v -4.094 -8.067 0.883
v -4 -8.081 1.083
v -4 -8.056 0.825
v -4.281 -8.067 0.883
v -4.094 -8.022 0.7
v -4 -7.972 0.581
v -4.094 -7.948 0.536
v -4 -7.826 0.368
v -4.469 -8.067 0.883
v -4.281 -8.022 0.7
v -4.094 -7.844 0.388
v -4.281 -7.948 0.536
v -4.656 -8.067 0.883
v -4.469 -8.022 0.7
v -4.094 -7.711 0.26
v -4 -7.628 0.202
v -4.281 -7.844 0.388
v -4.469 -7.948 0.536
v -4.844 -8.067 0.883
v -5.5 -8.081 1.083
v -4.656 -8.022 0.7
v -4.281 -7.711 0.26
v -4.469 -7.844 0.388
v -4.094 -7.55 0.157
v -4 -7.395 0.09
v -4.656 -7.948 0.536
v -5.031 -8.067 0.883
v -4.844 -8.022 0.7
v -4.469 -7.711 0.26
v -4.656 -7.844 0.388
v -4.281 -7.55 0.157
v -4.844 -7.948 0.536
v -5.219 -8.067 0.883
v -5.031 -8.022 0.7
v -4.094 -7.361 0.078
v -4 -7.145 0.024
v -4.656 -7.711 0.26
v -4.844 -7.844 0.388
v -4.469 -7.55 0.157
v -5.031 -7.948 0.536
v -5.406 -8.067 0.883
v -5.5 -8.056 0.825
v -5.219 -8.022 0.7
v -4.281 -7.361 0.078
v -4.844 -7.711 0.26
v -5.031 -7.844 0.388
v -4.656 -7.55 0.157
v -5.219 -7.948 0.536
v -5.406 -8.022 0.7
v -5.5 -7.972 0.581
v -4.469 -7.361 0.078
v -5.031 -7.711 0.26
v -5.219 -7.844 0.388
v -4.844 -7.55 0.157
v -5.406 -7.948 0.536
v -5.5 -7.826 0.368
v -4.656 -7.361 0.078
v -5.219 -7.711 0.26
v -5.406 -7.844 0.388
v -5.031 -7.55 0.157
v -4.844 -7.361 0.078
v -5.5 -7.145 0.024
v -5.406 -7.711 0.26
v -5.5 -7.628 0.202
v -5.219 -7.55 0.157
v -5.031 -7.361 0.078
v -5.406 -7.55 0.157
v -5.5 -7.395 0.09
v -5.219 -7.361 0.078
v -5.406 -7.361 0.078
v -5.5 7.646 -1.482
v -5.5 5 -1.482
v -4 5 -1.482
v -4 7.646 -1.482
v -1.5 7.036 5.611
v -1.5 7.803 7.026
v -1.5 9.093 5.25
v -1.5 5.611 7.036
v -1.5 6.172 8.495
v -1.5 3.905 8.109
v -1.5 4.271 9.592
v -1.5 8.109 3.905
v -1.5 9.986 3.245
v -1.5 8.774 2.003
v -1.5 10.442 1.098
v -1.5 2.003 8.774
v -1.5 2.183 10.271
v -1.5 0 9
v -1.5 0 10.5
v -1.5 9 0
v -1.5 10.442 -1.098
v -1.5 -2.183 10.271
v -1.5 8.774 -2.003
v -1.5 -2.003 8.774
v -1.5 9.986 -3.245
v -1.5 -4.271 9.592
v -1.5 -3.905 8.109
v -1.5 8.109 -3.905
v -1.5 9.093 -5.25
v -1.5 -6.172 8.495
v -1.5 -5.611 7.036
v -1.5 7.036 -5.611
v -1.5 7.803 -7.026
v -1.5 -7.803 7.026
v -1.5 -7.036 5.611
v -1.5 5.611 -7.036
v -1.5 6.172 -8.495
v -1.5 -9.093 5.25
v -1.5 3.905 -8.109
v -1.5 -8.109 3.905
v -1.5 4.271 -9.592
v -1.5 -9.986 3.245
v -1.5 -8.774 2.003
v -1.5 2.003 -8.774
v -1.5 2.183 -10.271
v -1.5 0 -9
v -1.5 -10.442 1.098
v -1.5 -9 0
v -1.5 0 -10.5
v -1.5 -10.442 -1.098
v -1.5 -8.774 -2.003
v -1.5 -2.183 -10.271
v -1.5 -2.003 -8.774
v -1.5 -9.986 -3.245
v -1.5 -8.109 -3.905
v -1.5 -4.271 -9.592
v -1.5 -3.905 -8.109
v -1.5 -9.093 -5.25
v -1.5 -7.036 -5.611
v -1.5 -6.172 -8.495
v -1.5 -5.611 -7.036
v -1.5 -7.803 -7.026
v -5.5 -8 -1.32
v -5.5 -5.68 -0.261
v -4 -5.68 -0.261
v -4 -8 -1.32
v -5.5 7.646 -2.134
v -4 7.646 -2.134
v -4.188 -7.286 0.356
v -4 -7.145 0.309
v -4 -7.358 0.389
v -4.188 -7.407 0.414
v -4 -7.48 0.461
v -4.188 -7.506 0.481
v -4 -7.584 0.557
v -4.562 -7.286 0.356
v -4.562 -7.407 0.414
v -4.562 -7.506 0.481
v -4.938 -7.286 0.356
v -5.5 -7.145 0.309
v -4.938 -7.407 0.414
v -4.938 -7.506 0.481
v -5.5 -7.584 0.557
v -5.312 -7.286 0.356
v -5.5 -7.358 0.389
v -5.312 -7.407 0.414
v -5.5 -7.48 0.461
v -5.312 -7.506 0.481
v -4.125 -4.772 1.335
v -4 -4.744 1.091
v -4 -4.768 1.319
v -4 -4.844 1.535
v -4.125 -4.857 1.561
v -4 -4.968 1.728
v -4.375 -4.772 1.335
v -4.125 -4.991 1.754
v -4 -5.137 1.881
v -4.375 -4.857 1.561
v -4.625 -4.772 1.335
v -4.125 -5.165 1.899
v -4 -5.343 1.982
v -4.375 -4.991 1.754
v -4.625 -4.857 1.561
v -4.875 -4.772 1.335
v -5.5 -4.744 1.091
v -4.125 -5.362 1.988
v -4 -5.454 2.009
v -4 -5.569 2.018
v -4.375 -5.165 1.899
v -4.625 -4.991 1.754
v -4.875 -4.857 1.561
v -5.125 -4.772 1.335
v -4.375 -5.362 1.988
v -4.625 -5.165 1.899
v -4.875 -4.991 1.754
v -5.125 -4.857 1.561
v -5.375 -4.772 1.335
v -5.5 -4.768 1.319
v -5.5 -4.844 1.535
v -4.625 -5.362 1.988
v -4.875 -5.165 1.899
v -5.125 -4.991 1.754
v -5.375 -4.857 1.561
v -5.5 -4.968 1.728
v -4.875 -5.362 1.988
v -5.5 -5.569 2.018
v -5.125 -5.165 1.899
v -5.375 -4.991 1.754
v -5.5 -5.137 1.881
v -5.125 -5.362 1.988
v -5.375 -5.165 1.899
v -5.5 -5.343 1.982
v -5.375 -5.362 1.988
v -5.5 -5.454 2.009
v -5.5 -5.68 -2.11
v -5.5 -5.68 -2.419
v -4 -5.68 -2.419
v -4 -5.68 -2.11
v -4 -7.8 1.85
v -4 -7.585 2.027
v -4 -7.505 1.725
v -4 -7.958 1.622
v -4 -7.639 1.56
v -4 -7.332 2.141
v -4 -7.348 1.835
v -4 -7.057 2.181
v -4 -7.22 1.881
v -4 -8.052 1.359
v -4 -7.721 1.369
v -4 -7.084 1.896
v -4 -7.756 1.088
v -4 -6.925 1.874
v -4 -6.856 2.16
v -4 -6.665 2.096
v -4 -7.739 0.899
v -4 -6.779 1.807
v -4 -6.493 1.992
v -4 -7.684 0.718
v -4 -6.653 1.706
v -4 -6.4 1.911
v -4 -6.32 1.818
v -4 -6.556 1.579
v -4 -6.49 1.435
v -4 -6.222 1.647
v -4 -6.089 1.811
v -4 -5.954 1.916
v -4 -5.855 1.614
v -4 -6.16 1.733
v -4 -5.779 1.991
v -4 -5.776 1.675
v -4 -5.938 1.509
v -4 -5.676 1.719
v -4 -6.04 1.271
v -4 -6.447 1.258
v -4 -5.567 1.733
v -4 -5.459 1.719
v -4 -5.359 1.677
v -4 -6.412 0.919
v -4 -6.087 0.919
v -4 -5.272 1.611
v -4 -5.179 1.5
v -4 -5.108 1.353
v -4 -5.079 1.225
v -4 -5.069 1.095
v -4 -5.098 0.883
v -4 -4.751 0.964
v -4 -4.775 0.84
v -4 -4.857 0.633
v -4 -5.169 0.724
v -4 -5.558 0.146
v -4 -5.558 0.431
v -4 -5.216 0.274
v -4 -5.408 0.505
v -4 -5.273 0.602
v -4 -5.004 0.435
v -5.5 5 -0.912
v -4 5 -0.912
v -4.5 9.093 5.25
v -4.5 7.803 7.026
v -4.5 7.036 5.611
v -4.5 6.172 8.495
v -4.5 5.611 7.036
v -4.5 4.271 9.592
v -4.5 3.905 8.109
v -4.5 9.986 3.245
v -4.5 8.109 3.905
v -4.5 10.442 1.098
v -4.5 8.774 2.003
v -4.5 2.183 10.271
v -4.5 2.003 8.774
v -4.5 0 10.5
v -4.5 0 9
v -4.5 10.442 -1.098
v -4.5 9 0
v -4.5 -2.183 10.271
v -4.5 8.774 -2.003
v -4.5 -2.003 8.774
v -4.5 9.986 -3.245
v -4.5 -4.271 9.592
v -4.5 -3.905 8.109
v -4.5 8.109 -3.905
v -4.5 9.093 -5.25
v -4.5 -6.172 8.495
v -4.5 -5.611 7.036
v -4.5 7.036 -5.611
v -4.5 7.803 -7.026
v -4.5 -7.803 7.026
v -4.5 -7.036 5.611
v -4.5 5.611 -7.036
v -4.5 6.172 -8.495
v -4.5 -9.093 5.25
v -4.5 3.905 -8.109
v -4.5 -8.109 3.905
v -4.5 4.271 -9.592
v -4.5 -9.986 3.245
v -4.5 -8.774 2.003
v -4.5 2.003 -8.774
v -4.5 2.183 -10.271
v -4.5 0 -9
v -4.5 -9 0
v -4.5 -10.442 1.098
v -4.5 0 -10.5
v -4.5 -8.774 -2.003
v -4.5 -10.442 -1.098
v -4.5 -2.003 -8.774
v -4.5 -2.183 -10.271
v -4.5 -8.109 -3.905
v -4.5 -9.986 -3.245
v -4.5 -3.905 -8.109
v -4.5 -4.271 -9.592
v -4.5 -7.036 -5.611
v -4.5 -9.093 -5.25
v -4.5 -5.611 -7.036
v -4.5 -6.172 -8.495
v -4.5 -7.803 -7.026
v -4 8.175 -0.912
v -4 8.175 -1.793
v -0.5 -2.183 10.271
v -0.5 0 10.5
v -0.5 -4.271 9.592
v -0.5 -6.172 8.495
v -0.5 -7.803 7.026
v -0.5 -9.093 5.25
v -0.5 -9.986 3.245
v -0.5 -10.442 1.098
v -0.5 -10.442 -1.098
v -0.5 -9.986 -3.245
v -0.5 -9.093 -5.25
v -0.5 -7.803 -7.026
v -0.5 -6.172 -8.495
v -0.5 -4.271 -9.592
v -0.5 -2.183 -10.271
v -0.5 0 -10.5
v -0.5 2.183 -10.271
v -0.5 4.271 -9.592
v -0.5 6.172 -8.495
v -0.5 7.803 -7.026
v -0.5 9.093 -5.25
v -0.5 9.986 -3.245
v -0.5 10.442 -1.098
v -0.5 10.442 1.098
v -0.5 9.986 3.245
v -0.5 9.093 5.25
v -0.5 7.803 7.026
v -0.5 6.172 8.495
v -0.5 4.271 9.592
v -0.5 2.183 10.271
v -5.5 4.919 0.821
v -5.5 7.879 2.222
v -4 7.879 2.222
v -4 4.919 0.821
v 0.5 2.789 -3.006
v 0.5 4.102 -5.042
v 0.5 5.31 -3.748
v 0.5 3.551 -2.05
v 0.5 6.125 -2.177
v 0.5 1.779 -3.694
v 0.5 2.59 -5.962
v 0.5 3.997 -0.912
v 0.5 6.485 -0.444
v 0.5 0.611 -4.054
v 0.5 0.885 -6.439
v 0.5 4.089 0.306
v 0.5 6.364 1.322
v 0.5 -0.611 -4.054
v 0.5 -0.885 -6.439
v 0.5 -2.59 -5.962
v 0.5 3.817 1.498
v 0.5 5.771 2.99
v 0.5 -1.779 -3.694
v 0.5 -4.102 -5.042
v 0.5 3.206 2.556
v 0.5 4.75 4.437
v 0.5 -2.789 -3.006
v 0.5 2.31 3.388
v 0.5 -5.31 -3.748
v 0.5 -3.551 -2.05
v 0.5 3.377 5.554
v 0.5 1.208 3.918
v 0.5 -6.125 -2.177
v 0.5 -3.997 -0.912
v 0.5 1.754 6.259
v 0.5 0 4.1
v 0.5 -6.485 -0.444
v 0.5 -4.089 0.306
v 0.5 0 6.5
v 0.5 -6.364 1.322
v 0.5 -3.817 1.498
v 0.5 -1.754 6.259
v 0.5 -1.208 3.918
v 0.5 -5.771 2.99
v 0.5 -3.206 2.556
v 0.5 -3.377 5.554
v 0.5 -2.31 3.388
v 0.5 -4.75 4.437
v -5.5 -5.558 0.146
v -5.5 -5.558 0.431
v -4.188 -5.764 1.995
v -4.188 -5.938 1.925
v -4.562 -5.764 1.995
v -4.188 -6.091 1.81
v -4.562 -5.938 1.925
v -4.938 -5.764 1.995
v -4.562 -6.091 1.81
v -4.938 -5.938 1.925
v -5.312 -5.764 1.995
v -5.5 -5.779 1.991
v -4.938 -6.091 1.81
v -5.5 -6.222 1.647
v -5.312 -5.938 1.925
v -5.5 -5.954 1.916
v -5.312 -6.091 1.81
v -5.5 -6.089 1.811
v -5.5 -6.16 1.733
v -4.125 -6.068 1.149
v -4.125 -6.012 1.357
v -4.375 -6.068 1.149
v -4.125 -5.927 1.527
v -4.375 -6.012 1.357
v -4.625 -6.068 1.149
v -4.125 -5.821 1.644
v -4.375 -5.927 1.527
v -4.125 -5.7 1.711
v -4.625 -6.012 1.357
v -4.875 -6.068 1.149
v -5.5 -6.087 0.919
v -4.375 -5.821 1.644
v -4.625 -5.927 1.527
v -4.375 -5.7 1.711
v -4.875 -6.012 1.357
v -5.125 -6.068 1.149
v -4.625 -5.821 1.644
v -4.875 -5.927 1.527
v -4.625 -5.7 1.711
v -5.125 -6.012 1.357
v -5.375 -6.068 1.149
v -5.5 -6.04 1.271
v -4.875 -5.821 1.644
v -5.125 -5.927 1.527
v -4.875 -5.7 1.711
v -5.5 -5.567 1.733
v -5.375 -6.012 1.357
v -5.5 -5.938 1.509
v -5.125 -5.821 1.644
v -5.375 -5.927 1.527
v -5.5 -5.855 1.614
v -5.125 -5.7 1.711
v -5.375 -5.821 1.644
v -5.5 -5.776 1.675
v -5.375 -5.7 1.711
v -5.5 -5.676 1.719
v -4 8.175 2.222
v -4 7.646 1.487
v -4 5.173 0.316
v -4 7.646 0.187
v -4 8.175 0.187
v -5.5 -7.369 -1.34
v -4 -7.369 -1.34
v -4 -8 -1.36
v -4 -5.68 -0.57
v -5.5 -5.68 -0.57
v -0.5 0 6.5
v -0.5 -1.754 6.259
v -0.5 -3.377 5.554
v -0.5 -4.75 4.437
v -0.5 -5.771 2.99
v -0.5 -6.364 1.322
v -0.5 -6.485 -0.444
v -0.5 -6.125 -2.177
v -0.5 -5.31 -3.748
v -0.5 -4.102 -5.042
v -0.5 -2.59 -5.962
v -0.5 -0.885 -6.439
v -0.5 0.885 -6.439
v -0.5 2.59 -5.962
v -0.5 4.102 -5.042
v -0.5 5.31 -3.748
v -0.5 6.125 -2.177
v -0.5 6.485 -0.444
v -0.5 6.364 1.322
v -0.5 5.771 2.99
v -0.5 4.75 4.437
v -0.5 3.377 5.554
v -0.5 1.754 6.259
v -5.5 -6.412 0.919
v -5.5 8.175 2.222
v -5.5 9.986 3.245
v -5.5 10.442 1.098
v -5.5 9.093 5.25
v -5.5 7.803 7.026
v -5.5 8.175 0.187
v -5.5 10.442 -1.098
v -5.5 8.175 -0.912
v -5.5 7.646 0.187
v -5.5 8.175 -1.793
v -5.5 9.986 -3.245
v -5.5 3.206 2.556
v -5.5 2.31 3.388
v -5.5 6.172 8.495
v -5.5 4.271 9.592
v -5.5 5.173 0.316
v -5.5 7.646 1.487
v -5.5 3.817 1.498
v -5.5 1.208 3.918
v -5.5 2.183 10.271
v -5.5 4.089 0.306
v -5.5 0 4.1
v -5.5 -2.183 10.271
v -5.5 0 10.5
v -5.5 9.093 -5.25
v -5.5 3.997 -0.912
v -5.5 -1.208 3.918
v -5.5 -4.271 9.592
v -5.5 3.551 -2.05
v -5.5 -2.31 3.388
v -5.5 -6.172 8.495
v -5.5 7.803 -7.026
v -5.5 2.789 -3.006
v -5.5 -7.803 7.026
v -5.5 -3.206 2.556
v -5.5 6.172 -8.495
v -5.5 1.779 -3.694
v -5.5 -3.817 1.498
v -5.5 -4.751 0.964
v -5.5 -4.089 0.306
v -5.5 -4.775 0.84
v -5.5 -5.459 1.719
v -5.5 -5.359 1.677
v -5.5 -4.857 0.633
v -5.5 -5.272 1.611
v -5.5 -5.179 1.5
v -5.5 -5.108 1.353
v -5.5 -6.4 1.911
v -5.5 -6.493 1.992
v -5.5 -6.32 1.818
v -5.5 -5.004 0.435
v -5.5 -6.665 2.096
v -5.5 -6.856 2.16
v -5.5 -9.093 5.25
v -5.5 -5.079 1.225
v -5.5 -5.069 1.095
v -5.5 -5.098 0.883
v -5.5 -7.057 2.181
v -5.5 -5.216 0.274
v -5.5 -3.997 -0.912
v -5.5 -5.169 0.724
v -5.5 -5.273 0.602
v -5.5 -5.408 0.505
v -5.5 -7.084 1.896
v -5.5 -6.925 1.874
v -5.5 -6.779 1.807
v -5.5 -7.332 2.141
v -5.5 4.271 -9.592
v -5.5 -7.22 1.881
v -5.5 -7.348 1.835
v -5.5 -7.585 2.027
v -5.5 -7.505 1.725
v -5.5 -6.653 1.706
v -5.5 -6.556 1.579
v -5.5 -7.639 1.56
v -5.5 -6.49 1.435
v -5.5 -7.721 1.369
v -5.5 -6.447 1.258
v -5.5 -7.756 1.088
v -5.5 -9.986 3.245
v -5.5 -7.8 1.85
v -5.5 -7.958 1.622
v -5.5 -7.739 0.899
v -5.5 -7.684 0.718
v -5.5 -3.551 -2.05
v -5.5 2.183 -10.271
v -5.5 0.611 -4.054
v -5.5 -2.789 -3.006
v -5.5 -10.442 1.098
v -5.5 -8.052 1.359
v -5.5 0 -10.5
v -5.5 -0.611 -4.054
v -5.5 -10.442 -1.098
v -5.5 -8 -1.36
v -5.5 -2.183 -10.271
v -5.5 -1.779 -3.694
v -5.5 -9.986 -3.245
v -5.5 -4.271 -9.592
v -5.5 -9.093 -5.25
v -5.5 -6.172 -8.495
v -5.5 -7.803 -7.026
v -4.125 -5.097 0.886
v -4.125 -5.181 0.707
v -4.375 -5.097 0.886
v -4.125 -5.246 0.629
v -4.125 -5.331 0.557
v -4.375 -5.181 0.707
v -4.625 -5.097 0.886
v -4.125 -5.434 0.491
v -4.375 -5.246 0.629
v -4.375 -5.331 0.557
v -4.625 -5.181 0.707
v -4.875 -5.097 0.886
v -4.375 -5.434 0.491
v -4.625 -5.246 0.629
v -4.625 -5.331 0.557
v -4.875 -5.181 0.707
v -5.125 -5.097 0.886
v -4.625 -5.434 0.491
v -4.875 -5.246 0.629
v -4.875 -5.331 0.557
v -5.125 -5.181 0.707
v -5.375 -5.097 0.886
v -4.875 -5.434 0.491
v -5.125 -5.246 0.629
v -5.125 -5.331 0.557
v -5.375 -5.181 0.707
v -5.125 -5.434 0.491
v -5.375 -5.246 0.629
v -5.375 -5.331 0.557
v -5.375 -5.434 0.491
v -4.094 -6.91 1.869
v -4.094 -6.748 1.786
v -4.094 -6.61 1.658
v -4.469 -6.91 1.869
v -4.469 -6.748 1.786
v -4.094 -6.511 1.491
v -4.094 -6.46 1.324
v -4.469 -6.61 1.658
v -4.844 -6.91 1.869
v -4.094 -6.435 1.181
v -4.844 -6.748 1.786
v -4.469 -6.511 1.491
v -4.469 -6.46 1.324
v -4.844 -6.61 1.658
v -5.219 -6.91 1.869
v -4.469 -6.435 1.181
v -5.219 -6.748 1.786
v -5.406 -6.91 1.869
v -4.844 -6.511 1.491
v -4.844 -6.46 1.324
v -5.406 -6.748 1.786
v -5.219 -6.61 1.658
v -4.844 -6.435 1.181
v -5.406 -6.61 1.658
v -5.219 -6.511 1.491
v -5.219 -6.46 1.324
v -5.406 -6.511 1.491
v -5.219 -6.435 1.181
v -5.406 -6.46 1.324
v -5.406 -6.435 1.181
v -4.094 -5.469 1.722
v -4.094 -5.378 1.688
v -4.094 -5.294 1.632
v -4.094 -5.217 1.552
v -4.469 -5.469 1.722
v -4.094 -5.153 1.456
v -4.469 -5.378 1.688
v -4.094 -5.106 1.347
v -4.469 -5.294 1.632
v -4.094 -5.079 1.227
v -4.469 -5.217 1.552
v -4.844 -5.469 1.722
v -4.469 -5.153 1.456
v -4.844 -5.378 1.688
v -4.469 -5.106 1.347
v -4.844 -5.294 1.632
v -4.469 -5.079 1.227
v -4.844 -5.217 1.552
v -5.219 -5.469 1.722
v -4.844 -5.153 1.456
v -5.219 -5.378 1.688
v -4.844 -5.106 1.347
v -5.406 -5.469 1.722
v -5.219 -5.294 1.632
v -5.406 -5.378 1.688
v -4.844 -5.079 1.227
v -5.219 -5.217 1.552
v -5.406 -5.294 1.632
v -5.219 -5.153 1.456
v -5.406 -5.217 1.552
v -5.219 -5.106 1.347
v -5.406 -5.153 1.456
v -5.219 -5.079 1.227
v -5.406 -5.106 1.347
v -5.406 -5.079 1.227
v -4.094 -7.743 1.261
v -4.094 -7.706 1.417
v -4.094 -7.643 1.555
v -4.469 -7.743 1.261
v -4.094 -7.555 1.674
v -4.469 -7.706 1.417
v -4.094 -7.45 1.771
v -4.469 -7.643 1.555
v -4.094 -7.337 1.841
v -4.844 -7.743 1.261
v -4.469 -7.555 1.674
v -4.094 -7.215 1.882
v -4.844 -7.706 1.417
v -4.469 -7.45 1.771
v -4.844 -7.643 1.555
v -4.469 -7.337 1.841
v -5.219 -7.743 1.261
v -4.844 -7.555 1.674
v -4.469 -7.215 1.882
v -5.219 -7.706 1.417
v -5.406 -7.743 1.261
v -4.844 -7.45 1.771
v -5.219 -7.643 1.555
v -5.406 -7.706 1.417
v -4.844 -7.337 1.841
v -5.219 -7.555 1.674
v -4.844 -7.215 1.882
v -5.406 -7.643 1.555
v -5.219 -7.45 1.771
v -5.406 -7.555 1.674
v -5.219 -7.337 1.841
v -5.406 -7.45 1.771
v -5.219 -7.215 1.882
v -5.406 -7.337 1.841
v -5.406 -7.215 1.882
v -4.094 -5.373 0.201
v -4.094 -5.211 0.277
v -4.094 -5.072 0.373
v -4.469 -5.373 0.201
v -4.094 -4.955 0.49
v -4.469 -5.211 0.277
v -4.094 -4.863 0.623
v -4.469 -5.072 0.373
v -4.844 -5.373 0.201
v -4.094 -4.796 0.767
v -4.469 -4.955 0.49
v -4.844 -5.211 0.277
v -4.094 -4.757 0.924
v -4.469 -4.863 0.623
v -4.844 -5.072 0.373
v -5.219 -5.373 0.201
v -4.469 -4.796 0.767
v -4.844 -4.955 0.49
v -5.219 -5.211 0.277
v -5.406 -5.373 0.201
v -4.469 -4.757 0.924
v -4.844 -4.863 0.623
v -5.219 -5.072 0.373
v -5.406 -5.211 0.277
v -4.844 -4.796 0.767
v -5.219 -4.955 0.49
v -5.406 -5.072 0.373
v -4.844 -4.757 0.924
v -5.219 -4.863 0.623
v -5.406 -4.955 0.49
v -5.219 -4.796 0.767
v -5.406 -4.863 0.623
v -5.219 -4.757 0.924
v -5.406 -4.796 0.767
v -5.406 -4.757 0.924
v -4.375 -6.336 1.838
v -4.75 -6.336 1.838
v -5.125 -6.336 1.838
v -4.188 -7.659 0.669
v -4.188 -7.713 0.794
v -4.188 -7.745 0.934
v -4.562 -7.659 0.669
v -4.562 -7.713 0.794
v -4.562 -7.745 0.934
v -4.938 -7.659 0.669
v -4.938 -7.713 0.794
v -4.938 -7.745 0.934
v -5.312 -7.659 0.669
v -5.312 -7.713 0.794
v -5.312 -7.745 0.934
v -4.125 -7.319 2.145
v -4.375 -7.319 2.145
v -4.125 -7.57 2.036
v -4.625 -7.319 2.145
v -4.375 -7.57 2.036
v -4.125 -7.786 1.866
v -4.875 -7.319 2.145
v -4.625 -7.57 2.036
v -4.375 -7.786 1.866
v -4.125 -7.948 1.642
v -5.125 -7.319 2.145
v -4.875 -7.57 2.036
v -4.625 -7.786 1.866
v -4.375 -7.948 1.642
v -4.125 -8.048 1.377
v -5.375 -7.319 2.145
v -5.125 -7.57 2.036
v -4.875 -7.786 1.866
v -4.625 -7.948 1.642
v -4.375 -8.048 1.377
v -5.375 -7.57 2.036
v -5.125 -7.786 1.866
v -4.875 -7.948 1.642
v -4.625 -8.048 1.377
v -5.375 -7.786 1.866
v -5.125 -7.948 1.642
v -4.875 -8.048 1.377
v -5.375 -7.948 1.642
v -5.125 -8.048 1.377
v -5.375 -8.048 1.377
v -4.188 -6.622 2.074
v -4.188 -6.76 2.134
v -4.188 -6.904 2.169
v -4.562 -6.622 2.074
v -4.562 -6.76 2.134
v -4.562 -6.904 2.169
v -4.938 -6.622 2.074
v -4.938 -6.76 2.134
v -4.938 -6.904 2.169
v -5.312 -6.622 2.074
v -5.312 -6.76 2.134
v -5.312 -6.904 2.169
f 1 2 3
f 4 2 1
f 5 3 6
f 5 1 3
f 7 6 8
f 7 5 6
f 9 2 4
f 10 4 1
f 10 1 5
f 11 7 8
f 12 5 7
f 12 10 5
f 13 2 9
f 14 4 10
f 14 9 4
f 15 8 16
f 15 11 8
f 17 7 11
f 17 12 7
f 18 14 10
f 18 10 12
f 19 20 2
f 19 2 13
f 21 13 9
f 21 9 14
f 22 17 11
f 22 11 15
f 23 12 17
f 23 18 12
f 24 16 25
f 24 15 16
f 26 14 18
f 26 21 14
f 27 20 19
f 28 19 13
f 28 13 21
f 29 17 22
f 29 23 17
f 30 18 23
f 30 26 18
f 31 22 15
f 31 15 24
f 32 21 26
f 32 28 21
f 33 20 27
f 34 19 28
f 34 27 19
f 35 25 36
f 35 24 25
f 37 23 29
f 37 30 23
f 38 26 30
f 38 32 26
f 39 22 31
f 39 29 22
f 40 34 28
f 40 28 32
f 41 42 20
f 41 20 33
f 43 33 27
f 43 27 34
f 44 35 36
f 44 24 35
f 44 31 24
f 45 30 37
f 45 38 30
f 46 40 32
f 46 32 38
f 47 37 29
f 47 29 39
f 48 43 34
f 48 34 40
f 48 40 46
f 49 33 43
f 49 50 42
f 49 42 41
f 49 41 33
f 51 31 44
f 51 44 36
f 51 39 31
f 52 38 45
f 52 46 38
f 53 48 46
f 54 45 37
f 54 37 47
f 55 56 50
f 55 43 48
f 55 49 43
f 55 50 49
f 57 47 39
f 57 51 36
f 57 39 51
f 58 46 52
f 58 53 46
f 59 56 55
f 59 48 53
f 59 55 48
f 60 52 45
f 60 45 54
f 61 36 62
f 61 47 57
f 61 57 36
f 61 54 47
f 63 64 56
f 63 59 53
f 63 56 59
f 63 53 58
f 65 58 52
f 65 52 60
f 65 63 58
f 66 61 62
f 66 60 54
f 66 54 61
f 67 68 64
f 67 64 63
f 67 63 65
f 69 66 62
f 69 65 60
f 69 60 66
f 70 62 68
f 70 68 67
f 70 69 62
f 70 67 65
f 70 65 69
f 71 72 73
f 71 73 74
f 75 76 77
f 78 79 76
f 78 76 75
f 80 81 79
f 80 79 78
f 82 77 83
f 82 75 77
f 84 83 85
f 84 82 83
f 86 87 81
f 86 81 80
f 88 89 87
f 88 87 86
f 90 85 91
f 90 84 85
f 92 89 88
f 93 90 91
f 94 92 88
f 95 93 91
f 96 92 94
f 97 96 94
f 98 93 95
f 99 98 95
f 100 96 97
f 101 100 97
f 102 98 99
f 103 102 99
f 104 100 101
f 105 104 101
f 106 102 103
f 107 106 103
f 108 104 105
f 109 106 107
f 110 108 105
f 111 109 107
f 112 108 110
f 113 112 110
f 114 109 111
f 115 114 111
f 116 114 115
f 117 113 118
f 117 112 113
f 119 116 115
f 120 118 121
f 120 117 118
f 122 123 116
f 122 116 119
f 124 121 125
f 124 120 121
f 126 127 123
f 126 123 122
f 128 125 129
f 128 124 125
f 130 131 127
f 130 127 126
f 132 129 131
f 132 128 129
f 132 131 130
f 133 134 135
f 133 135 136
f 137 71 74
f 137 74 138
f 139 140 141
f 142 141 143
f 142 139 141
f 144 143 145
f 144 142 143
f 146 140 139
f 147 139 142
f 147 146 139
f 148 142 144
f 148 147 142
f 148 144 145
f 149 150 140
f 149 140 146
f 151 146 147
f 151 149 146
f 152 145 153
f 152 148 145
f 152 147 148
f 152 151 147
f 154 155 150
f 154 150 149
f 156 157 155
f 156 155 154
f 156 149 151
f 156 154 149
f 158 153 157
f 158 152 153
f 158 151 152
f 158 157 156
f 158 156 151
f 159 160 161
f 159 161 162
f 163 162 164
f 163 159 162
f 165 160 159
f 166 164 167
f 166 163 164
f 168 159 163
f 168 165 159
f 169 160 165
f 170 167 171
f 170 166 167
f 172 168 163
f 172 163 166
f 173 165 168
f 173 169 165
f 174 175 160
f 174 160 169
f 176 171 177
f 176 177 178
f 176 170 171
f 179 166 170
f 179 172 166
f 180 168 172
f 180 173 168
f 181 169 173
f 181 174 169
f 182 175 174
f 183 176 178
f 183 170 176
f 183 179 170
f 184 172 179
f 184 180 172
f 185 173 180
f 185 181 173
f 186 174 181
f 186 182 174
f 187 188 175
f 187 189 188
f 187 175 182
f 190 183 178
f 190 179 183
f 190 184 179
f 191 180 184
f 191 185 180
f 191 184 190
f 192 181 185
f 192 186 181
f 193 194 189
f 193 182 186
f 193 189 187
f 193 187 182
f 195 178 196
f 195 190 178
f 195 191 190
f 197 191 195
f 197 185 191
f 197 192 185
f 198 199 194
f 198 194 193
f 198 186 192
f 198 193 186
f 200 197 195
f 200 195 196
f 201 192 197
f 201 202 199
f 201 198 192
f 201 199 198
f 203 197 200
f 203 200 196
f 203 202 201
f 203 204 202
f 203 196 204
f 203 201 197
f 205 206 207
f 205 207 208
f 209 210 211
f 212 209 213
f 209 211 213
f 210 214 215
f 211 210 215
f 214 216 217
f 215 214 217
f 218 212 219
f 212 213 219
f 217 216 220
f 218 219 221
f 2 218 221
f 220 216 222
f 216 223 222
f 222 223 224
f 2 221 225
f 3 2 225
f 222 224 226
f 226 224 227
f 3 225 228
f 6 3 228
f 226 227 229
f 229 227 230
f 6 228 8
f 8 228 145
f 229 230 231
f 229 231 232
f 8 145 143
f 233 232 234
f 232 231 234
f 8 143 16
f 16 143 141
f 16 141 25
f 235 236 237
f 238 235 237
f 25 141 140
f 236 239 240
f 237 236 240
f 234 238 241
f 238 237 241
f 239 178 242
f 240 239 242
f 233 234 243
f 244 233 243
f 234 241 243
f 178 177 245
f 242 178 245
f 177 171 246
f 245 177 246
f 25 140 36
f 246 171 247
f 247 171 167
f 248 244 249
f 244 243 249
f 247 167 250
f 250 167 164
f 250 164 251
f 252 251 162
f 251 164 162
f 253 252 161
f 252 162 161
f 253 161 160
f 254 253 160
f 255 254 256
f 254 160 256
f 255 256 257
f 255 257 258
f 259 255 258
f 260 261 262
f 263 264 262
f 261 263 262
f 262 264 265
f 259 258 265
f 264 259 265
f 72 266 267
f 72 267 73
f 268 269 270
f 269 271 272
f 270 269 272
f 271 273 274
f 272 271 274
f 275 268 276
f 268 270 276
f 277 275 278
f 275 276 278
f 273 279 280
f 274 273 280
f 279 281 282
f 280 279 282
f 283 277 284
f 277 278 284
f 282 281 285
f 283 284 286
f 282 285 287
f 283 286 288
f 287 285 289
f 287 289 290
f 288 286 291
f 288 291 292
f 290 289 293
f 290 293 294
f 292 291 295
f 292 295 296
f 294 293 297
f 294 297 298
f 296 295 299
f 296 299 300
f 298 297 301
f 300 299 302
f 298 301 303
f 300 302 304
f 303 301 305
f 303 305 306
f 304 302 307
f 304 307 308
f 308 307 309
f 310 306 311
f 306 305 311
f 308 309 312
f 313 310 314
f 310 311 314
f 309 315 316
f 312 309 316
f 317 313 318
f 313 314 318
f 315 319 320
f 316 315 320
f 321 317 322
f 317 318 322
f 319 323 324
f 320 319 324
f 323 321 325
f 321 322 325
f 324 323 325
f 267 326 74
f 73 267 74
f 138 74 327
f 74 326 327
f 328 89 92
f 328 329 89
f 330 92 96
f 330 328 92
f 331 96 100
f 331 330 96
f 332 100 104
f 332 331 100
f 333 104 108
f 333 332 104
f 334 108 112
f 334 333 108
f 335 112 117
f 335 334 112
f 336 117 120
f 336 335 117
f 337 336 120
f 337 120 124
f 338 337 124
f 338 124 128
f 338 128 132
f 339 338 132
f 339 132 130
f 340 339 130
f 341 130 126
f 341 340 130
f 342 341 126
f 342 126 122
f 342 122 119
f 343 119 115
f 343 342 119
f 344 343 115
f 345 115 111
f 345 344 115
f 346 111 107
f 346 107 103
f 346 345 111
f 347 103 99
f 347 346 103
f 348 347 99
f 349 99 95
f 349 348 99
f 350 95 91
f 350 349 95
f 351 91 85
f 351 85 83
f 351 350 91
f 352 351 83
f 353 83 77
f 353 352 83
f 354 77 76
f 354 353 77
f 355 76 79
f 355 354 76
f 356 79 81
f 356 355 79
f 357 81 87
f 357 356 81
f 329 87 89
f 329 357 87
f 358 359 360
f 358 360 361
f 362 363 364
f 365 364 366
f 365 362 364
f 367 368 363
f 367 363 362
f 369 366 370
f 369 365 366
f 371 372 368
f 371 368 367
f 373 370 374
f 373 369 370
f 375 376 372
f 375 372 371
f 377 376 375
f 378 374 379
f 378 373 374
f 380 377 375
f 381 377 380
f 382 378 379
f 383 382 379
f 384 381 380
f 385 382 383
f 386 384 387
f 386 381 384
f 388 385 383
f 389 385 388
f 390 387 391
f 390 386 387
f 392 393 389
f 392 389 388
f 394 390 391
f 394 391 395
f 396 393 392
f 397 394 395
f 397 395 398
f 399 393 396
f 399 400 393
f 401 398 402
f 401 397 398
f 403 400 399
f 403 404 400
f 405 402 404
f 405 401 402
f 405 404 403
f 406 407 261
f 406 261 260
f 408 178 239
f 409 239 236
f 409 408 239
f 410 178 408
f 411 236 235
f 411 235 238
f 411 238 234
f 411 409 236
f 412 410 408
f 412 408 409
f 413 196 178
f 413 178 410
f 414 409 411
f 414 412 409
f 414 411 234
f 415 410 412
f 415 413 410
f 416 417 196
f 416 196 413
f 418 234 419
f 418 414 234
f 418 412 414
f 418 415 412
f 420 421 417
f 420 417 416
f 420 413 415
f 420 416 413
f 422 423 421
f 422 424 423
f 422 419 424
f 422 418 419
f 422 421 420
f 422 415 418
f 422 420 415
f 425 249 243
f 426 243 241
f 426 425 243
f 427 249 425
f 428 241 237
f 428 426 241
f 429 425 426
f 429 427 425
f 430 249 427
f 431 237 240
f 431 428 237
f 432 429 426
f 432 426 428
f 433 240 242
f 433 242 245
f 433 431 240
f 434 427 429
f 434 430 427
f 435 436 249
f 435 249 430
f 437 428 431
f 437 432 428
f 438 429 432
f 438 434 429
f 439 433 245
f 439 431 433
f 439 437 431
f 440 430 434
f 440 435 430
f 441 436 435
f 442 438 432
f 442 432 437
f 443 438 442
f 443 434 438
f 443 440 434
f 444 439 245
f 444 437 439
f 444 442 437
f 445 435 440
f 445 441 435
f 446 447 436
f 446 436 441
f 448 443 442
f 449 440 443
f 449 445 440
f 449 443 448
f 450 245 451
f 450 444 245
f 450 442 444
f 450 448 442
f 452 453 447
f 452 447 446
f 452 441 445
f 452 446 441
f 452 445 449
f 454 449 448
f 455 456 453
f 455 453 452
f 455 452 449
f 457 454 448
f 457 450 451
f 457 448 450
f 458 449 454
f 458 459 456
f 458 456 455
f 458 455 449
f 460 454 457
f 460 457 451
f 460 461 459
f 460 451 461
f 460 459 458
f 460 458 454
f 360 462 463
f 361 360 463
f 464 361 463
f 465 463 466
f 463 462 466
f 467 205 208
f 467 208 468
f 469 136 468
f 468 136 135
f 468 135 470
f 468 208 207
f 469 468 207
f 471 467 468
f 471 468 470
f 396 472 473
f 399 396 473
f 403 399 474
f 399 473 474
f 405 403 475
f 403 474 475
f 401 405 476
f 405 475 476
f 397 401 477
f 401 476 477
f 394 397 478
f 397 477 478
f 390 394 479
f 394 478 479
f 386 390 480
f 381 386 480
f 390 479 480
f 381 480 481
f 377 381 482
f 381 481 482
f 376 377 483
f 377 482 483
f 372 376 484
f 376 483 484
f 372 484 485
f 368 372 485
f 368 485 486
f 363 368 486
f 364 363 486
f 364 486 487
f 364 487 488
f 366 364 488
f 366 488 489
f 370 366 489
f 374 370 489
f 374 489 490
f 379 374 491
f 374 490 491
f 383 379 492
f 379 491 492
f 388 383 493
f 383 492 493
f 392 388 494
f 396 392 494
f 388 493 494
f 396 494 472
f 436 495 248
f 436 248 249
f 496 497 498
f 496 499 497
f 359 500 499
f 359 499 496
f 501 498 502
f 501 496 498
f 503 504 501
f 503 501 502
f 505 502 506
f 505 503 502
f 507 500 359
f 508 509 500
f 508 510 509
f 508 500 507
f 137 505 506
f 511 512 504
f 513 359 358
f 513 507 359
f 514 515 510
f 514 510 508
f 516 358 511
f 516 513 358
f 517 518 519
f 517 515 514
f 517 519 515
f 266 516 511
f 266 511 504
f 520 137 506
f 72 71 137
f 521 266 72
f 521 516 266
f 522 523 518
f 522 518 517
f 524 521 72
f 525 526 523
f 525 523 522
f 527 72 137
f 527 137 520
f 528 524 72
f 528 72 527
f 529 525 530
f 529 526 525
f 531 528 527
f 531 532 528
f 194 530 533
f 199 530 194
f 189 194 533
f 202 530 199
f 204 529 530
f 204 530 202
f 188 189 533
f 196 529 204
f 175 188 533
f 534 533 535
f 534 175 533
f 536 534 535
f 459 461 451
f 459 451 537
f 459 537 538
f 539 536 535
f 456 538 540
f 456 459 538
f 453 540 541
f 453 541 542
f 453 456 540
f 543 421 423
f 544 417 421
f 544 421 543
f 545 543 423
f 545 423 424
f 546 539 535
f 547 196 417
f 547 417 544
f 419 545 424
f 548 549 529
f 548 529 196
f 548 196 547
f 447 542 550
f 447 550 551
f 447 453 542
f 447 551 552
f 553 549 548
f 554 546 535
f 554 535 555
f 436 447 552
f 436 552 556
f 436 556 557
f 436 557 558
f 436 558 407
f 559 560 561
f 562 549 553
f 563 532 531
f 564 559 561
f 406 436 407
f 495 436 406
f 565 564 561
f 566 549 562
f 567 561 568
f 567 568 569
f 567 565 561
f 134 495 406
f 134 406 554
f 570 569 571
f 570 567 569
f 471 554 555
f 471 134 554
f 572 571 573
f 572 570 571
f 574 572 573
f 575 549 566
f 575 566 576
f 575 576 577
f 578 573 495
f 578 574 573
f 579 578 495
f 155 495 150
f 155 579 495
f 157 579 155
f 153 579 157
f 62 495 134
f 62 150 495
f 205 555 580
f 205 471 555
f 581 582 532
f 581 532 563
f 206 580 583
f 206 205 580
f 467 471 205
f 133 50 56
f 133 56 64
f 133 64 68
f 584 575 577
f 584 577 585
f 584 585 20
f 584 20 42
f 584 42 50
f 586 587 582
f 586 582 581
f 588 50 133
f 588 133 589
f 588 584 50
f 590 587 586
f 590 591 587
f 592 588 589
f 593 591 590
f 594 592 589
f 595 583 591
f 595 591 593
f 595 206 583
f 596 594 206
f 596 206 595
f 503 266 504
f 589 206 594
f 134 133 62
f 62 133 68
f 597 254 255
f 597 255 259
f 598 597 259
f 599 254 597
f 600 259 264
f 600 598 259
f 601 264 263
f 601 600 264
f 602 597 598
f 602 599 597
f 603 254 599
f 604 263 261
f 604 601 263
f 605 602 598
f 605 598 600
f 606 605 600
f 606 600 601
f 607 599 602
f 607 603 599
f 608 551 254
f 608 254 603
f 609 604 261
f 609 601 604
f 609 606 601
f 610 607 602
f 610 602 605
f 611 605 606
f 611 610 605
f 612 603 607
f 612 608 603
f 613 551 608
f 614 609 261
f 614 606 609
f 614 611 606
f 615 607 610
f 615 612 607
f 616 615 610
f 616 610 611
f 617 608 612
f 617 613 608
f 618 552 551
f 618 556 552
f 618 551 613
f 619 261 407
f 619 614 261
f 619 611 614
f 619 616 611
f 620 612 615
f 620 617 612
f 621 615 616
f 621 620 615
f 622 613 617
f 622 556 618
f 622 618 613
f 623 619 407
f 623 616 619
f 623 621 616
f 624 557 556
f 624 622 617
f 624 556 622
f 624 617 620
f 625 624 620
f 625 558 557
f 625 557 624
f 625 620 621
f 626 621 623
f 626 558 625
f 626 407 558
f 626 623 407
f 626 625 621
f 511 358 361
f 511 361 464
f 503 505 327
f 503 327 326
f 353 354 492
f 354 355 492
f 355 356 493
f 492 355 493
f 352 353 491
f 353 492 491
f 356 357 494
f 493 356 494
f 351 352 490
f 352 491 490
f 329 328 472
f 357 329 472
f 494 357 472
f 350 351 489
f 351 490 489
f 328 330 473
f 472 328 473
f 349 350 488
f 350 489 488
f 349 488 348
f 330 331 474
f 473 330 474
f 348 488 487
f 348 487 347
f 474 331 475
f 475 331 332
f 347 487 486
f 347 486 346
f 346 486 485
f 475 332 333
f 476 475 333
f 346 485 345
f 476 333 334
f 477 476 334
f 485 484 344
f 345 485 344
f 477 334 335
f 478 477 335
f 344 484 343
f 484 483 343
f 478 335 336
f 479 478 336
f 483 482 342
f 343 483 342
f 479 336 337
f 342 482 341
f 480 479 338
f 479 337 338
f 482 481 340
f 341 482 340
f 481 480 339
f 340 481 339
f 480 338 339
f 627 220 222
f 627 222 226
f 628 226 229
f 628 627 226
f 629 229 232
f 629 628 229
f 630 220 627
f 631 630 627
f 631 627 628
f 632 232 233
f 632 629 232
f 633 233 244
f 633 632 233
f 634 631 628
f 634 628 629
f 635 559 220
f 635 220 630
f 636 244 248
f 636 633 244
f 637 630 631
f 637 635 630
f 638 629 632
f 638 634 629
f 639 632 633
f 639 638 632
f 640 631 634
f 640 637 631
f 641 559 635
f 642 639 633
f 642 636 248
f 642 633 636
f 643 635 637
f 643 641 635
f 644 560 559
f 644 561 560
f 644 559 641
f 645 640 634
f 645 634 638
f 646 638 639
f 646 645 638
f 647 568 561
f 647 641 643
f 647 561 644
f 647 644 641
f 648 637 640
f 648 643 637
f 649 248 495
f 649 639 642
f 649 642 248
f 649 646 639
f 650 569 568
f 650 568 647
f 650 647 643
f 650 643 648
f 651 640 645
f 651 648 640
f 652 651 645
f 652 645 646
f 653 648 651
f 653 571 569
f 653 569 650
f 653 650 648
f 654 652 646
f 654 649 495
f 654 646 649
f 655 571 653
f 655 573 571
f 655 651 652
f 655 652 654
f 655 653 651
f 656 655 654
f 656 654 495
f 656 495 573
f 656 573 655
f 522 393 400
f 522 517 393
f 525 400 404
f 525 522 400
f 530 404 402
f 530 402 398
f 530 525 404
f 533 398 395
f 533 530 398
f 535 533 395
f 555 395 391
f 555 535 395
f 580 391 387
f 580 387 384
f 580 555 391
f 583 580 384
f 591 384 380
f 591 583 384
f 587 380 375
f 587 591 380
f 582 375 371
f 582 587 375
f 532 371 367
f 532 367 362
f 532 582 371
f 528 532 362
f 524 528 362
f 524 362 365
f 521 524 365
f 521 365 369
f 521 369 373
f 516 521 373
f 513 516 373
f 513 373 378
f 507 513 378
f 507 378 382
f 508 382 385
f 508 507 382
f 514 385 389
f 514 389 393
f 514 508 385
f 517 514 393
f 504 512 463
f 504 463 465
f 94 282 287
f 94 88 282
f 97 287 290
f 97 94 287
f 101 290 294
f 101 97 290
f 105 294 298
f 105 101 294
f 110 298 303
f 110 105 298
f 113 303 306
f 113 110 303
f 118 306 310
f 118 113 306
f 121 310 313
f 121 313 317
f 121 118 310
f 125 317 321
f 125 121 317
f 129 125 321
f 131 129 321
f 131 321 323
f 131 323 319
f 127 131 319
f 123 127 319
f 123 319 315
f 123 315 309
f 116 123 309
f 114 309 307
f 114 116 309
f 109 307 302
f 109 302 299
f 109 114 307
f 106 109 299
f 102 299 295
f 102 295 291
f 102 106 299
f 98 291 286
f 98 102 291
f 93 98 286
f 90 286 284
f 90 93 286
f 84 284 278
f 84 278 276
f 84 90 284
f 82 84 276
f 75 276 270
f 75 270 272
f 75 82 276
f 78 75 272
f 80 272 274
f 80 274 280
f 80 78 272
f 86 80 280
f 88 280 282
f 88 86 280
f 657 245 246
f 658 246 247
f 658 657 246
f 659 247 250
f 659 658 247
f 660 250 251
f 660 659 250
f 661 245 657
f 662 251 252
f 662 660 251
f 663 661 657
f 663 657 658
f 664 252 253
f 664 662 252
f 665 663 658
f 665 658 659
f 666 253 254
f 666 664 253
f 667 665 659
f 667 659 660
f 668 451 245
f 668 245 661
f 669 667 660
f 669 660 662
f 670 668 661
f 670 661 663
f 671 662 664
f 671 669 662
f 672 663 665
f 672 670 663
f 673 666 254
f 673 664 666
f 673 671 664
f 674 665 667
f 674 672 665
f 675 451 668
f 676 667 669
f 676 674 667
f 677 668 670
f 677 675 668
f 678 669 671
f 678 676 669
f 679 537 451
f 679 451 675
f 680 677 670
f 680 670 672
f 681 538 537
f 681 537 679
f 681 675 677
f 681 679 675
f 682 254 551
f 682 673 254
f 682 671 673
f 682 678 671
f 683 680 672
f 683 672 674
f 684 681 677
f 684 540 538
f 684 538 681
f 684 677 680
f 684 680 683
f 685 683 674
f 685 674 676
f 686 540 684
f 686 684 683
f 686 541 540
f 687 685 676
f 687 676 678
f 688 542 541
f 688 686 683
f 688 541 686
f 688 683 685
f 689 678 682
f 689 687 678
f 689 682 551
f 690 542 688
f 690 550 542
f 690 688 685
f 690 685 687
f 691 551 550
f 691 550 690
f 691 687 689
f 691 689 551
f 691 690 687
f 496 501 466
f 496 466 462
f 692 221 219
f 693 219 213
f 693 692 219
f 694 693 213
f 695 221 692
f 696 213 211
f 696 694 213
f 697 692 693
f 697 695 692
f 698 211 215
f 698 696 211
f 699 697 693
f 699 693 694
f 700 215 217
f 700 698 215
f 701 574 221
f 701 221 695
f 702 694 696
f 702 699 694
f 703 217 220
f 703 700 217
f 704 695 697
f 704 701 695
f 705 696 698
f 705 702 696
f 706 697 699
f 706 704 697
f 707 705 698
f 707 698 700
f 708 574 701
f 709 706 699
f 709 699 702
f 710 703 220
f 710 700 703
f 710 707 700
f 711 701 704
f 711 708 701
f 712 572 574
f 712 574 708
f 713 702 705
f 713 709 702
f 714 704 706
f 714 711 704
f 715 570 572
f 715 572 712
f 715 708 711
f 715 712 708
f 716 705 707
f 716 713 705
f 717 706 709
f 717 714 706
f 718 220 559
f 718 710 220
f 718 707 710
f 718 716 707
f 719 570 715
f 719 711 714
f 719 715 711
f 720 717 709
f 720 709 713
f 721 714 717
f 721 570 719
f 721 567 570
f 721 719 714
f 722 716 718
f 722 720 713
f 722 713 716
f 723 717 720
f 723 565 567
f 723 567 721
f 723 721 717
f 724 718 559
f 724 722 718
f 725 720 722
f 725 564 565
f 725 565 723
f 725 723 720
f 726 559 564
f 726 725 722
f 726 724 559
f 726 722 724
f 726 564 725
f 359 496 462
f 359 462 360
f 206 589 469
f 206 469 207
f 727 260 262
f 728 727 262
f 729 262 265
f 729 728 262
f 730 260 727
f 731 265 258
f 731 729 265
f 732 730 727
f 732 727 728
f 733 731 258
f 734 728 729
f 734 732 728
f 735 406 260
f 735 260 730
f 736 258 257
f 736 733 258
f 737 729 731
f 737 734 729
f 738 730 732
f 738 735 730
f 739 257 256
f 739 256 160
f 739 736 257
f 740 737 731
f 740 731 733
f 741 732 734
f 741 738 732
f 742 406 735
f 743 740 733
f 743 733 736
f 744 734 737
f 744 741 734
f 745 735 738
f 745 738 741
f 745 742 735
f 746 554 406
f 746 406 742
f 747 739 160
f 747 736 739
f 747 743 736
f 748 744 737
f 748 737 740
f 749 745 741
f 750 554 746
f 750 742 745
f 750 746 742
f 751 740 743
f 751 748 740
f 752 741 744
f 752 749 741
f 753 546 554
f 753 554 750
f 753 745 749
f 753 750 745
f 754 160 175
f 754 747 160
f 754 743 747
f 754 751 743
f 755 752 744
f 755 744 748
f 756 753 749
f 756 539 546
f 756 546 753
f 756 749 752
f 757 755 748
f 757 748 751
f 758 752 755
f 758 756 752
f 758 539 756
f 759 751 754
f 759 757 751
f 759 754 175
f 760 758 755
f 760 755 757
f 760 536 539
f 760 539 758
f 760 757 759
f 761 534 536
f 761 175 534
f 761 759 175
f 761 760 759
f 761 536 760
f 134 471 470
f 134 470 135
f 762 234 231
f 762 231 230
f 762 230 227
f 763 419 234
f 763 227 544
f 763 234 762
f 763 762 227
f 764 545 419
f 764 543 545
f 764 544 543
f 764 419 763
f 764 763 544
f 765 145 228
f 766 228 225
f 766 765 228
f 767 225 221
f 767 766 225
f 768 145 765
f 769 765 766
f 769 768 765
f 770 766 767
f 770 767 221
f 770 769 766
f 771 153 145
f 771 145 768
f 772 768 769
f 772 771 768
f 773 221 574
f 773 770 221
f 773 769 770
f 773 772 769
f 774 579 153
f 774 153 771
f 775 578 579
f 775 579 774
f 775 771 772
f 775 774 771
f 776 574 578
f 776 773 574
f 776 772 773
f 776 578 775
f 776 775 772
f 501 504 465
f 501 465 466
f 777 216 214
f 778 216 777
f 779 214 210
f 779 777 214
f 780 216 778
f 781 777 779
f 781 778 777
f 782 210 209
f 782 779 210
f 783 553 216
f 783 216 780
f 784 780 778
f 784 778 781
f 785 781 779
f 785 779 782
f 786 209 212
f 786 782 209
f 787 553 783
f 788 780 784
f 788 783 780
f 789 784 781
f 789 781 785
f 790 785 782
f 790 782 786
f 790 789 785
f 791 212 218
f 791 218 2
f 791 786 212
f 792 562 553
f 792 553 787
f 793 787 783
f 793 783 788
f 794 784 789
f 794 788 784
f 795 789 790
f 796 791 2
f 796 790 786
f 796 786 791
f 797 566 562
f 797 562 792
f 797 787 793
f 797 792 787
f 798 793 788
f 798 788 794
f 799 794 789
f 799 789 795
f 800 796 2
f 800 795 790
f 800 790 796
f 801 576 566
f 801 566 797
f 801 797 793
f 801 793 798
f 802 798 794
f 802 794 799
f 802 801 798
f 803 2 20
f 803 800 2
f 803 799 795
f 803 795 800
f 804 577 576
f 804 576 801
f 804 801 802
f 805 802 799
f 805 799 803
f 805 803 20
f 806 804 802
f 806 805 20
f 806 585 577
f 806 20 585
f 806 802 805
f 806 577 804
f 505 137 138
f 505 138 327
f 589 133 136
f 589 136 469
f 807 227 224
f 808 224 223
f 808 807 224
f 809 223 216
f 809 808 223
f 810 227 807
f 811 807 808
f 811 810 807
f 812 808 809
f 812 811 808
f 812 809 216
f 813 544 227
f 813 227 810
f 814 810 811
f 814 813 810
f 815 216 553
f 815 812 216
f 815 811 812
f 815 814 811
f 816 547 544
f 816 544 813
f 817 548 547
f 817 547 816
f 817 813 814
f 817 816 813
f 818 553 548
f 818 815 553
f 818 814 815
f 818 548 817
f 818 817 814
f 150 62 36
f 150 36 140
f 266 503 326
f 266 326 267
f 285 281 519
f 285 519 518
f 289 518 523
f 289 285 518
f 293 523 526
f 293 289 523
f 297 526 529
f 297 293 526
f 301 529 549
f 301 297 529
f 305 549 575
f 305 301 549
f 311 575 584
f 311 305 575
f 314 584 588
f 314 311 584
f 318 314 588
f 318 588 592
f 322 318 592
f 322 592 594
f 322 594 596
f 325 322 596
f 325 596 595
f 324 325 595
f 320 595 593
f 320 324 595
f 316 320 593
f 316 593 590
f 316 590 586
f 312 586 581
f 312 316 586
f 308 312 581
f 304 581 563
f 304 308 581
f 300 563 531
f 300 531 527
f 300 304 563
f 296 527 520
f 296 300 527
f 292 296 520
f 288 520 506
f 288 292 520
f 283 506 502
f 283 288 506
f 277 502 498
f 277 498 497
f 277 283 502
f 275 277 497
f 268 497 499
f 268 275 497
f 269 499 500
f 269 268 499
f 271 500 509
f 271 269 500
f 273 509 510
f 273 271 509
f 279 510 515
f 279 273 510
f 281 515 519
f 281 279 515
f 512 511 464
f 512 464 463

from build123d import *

# Parameters (mm, degrees)
SKETCH1_W           = 5
SKETCH1_H           = 6.4
SKETCH2_W           = 3
SKETCH2_H           = 1.5
SKETCH6_R           = 6.5
SKETCH6_R_2         = 4.1
BOSS_EXTRUDE1_DEPTH = 1
CUT_EXTRUDE2_DEPTH  = 1.5


with BuildPart() as part:
    # Sketch1 → Revolve1 (revolve)
    with BuildSketch(Plane.XY, mode=Mode.PRIVATE) as revolve1_sk:
        with Locations((-3, 7.3)):
            Rectangle(SKETCH1_W, SKETCH1_H)
    revolve(revolve1_sk.sketch.rotate(Axis((0, 0, 0), (1, 0, 0)), 90), axis=Axis((0, 0, 0), (1, 0, 0)))

    # Sketch2 → Cut-Revolve1 (revolve, cut)
    with BuildSketch(Plane.XY, mode=Mode.PRIVATE) as cut_revolve1_sk:
        with Locations((-3, 9.75)):
            Rectangle(SKETCH2_W, SKETCH2_H)
    revolve(cut_revolve1_sk.sketch.rotate(Axis((0, 0, 0), (1, 0, 0)), 90), axis=Axis((0, 0, 0), (1, 0, 0)), mode=Mode.SUBTRACT)

    # Sketch6 → Boss-Extrude1 (add)
    with BuildSketch(Plane(origin=(-0.5, 0, 0), x_dir=(0, 0, -1), z_dir=(1, 0, 0))):
        with Locations(Location((0, 0, 0), (0, 0, 180))):
            Circle(SKETCH6_R)
        with Locations(Location((0, 0, 0), (0, 0, 180))):
            Circle(SKETCH6_R_2, mode=Mode.SUBTRACT)
    extrude(amount=BOSS_EXTRUDE1_DEPTH)

    # Sketch5 → Cut-Extrude2 (cut)
    with BuildSketch(Plane.ZY.offset(5.5)):
        Polygon((-1.793384415, 8.175), (-0.9125, 8.175), (-0.9125, 5), (-1.482371795, 5), (-1.482371795, 7.645833333), (-2.133653846, 7.645833333), align=None)
        Polygon((0.186538462, 8.175), (2.221794872, 8.175), (2.221794872, 7.879251803), (0.821284054, 4.918589744), (0.316286058, 5.172996795), (1.486558494, 7.645833333), (0.186538462, 7.645833333), align=None)
        Polygon((-2.418589744, -5.679807692), (-2.110121194, -5.679807692), (-1.339903846, -7.369070513), (-0.569686498, -5.679807692), (-0.261217949, -5.679807692), (-1.319551282, -8), (-1.36025641, -8), align=None)
        with BuildLine():
            Line((0.430769231, -5.557692308), (0.145833333, -5.557692308))
            add(Edge.make_bspline(
                [(0.145833333, -5.557692308), (0.153552711, -5.525731412), (0.168643464, -5.463250474), (0.20011912, -5.37398103), (0.234408445, -5.289504693), (0.275582847, -5.211403254), (0.320494359, -5.138107107), (0.371949971, -5.071278687), (0.427575719, -5.009218354), (0.489102638, -4.954142774), (0.553626495, -4.90427012), (0.622056471, -4.861747746), (0.693015811, -4.825167979), (0.766996153, -4.795032483), (0.844217751, -4.772330758), (0.923982481, -4.755859941), (1.00649937, -4.745163716), (1.062513256, -4.74411981), (1.090955529, -4.743589744)],
                knots=[0, 0, 0, 0, 1.162005537, 2.271625781, 3.343758855, 4.383309926, 5.390229558, 6.379919256, 7.361854164, 8.333198761, 9.295911338, 10.242430842, 11.177959212, 12.116337295, 13.062827104, 14.020064771, 14.994644689, 16, 16, 16, 16], degree=3))
            add(Edge.make_bspline(
                [(1.090955529, -4.743589744), (1.132396302, -4.744840902), (1.214373905, -4.747315929), (1.334808955, -4.769916882), (1.450947569, -4.805681109), (1.56151853, -4.855096562), (1.664223822, -4.916045053), (1.755605934, -4.988584493), (1.834426226, -5.071315288), (1.90055184, -5.162694114), (1.952327018, -5.26035304), (1.990505371, -5.360864611), (2.013747896, -5.4639904), (2.016760115, -5.533620217), (2.018269231, -5.568504607)],
                knots=[0, 0, 0, 0, 1.083050992, 2.142477498, 3.193116406, 4.255571735, 5.30263384, 6.308962982, 7.297363603, 8.282367274, 9.249857812, 10.179914175, 11.08814088, 12, 12, 12, 12], degree=3))
            add(Edge.make_bspline(
                [(2.018269231, -5.568504607), (2.017213687, -5.602075057), (2.015148153, -5.667767217), (1.99760972, -5.763671718), (1.968094682, -5.854060884), (1.927209968, -5.939315224), (1.874285848, -6.018894186), (1.810175616, -6.092976815), (1.734426773, -6.161891694), (1.677023736, -6.201370073), (1.647470954, -6.221694712)],
                knots=[0, 0, 0, 0, 1.024540389, 2.004866551, 2.965041327, 3.920577974, 4.882998113, 5.874504559, 6.905732034, 8, 8, 8, 8], degree=3))
            add(Edge.make_bspline(
                [(1.647470954, -6.221694712), (1.681245474, -6.238003481), (1.748162567, -6.270315872), (1.839376261, -6.333685023), (1.922178334, -6.406851852), (1.968355279, -6.46394983), (1.99155649, -6.492638221)],
                knots=[0, 0, 0, 0, 1.015518401, 2.012035669, 3.001164323, 4, 4, 4, 4], degree=3))
            add(Edge.make_bspline(
                [(1.99155649, -6.492638221), (2.006833994, -6.513554896), (2.037138821, -6.55504572), (2.074545341, -6.621753764), (2.108480752, -6.689201186), (2.134924165, -6.75919579), (2.155401887, -6.83092631), (2.170039573, -6.904515912), (2.179132901, -6.980024689), (2.180435152, -7.031108153), (2.181089744, -7.056785857)],
                knots=[0, 0, 0, 0, 1.025084078, 2.033381695, 3.024893161, 4.013698104, 4.991890475, 5.976764909, 6.982997093, 8, 8, 8, 8], degree=3))
            add(Edge.make_bspline(
                [(2.181089744, -7.056785857), (2.179461863, -7.101244676), (2.176213764, -7.189953089), (2.147181497, -7.321012301), (2.1021752, -7.449124006), (2.038260694, -7.571656182), (1.960366596, -7.686301242), (1.867695309, -7.788877608), (1.761299782, -7.877050628), (1.642640372, -7.950719906), (1.514082691, -8.009609735), (1.376581975, -8.050483273), (1.232119426, -8.077104287), (1.133052806, -8.079958946), (1.0826873, -8.081410256)],
                knots=[0, 0, 0, 0, 0.955779014, 1.907060117, 2.875433937, 3.871313158, 4.872415639, 5.851225146, 6.836215519, 7.83643374, 8.849228613, 9.86973379, 10.916971861, 12, 12, 12, 12], degree=3))
            add(Edge.make_bspline(
                [(1.0826873, -8.081410256), (1.048742649, -8.080622663), (0.981950895, -8.079072942), (0.883758578, -8.068478782), (0.790031037, -8.04912942), (0.700641545, -8.023091422), (0.61551069, -7.990078913), (0.534898252, -7.94896838), (0.458308277, -7.900607231), (0.386463514, -7.844424619), (0.319372528, -7.781576547), (0.258818271, -7.710947302), (0.203791173, -7.633842514), (0.155764636, -7.549366599), (0.112551115, -7.458611259), (0.07700839, -7.360414407), (0.045725053, -7.255653901), (0.03118041, -7.182649094), (0.023717949, -7.145192308)],
                knots=[0, 0, 0, 0, 1.048658725, 2.063410685, 3.046034179, 4.001477787, 4.936774919, 5.862367409, 6.792675028, 7.730719943, 8.675894397, 9.627829632, 10.600096036, 11.597688215, 12.626045268, 13.701542398, 14.82072376, 16, 16, 16, 16], degree=3))
            Line((0.023717949, -7.145192308), (0.308653846, -7.145192308))
            add(Edge.make_bspline(
                [(0.308653846, -7.145192308), (0.316077261, -7.169638913), (0.330516446, -7.217189683), (0.355094845, -7.285624817), (0.383096778, -7.348361051), (0.413136413, -7.405858597), (0.444685432, -7.458683705), (0.479986828, -7.505439544), (0.516425981, -7.548179763), (0.543893681, -7.572259518), (0.557336739, -7.584044471)],
                knots=[0, 0, 0, 0, 1.198163088, 2.33053128, 3.407730985, 4.417276592, 5.372219308, 6.28897303, 7.162600585, 8, 8, 8, 8], degree=3))
            add(Edge.make_bspline(
                [(0.557336739, -7.584044471), (0.575113633, -7.597749888), (0.610612549, -7.625118417), (0.668459444, -7.660044894), (0.729296877, -7.69030811), (0.794443045, -7.713425463), (0.862492159, -7.732999484), (0.934544126, -7.745808812), (1.009963272, -7.754597367), (1.061459744, -7.755372912), (1.087775441, -7.755769231)],
                knots=[0, 0, 0, 0, 0.946170439, 1.889420265, 2.845303464, 3.807233317, 4.801018734, 5.828864929, 6.890507805, 8, 8, 8, 8], degree=3))
            add(Edge.make_bspline(
                [(1.087775441, -7.755769231), (1.117487547, -7.755210517), (1.175587005, -7.754118), (1.260363913, -7.744070751), (1.341015669, -7.729438162), (1.416646823, -7.706838528), (1.488248069, -7.678915898), (1.554815708, -7.643856273), (1.617223605, -7.602722133), (1.674672423, -7.555968753), (1.726330133, -7.504786397), (1.771813834, -7.451253111), (1.810480491, -7.395594608), (1.841671309, -7.337502884), (1.866300737, -7.277218498), (1.88306764, -7.214572274), (1.8947258, -7.150076897), (1.895675227, -7.106235618), (1.896153846, -7.084134615)],
                knots=[0, 0, 0, 0, 1.217147791, 2.380027433, 3.494444702, 4.572153297, 5.609568379, 6.639424714, 7.649109417, 8.668170816, 9.669597737, 10.625200337, 11.543417969, 12.441394052, 13.322311151, 14.205496177, 15.095365482, 16, 16, 16, 16], degree=3))
            add(Edge.make_bspline(
                [(1.896153846, -7.084134615), (1.894765644, -7.054551472), (1.891996147, -6.995532388), (1.870851936, -6.908702874), (1.836073109, -6.825043064), (1.787384474, -6.745980312), (1.728115634, -6.672705029), (1.658841755, -6.607325899), (1.578987576, -6.553378031), (1.505490981, -6.516104749), (1.440389731, -6.490671117), (1.384677204, -6.473730256), (1.322305142, -6.459385012), (1.254027812, -6.44603888), (1.179330751, -6.434680228), (1.098295282, -6.425208009), (1.010904984, -6.417628794), (0.95040657, -6.414244157), (0.919230769, -6.4125)],
                knots=[0, 0, 0, 0, 1.07054697, 2.135767047, 3.216561865, 4.33974944, 5.486079747, 6.621378074, 7.775625952, 8.963672916, 9.598146892, 10.304877434, 11.070270905, 11.915000392, 12.823868403, 13.805723172, 14.86925407, 16, 16, 16, 16], degree=3))
            Line((0.919230769, -6.4125), (0.919230769, -6.086858974))
            add(Edge.make_bspline(
                [(0.919230769, -6.086858974), (0.958511112, -6.086192402), (1.035451655, -6.084886752), (1.147841489, -6.069095199), (1.255313708, -6.04725063), (1.355486538, -6.013790491), (1.446789299, -5.974928222), (1.526000653, -5.929705146), (1.592010851, -5.879436052), (1.644499108, -5.823345042), (1.683986337, -5.76318782), (1.712857789, -5.700489138), (1.729912371, -5.634699454), (1.732188997, -5.58980072), (1.733333333, -5.567232572)],
                knots=[0, 0, 0, 0, 1.321986639, 2.589447074, 3.816329219, 5.01088745, 6.139805852, 7.153945165, 8.075214402, 8.924034688, 9.728124013, 10.488707548, 11.240355623, 12, 12, 12, 12], degree=3))
            add(Edge.make_bspline(
                [(1.733333333, -5.567232572), (1.732957403, -5.550652046), (1.732209509, -5.517665876), (1.722777692, -5.46947385), (1.708604455, -5.422755134), (1.689119272, -5.377708406), (1.663038735, -5.334646087), (1.63182759, -5.293201044), (1.59466367, -5.253609901), (1.552077443, -5.21670704), (1.506346735, -5.181537803), (1.456227296, -5.151680433), (1.403230309, -5.126148841), (1.347297101, -5.105094507), (1.288246156, -5.089256438), (1.226354921, -5.077884639), (1.16150538, -5.070774766), (1.117262451, -5.069751132), (1.094771635, -5.069230769)],
                knots=[0, 0, 0, 0, 0.884392785, 1.759457502, 2.611959086, 3.489218968, 4.37281399, 5.2945488, 6.255912374, 7.266815255, 8.301784654, 9.332968512, 10.37626691, 11.440494194, 12.520033166, 13.637162961, 14.798855837, 16, 16, 16, 16], degree=3))
            add(Edge.make_bspline(
                [(1.094771635, -5.069230769), (1.058620479, -5.070492933), (0.988008863, -5.072958233), (0.886213903, -5.094550967), (0.791581364, -5.129002514), (0.719247002, -5.170126039), (0.665832095, -5.210721075), (0.627662302, -5.246174383), (0.590178696, -5.285574159), (0.55584726, -5.331347113), (0.521127296, -5.380393416), (0.489518301, -5.435206327), (0.458802723, -5.494356028), (0.440294695, -5.536171353), (0.430769231, -5.557692308)],
                knots=[0, 0, 0, 0, 1.472543308, 2.876219568, 4.221790263, 5.565193594, 6.249813518, 6.953379497, 7.687249741, 8.463570142, 9.283606569, 10.136032583, 11.040678096, 12, 12, 12, 12], degree=3))
        make_face()
    extrude(amount=-CUT_EXTRUDE2_DEPTH, mode=Mode.SUBTRACT)


solid = part.part
